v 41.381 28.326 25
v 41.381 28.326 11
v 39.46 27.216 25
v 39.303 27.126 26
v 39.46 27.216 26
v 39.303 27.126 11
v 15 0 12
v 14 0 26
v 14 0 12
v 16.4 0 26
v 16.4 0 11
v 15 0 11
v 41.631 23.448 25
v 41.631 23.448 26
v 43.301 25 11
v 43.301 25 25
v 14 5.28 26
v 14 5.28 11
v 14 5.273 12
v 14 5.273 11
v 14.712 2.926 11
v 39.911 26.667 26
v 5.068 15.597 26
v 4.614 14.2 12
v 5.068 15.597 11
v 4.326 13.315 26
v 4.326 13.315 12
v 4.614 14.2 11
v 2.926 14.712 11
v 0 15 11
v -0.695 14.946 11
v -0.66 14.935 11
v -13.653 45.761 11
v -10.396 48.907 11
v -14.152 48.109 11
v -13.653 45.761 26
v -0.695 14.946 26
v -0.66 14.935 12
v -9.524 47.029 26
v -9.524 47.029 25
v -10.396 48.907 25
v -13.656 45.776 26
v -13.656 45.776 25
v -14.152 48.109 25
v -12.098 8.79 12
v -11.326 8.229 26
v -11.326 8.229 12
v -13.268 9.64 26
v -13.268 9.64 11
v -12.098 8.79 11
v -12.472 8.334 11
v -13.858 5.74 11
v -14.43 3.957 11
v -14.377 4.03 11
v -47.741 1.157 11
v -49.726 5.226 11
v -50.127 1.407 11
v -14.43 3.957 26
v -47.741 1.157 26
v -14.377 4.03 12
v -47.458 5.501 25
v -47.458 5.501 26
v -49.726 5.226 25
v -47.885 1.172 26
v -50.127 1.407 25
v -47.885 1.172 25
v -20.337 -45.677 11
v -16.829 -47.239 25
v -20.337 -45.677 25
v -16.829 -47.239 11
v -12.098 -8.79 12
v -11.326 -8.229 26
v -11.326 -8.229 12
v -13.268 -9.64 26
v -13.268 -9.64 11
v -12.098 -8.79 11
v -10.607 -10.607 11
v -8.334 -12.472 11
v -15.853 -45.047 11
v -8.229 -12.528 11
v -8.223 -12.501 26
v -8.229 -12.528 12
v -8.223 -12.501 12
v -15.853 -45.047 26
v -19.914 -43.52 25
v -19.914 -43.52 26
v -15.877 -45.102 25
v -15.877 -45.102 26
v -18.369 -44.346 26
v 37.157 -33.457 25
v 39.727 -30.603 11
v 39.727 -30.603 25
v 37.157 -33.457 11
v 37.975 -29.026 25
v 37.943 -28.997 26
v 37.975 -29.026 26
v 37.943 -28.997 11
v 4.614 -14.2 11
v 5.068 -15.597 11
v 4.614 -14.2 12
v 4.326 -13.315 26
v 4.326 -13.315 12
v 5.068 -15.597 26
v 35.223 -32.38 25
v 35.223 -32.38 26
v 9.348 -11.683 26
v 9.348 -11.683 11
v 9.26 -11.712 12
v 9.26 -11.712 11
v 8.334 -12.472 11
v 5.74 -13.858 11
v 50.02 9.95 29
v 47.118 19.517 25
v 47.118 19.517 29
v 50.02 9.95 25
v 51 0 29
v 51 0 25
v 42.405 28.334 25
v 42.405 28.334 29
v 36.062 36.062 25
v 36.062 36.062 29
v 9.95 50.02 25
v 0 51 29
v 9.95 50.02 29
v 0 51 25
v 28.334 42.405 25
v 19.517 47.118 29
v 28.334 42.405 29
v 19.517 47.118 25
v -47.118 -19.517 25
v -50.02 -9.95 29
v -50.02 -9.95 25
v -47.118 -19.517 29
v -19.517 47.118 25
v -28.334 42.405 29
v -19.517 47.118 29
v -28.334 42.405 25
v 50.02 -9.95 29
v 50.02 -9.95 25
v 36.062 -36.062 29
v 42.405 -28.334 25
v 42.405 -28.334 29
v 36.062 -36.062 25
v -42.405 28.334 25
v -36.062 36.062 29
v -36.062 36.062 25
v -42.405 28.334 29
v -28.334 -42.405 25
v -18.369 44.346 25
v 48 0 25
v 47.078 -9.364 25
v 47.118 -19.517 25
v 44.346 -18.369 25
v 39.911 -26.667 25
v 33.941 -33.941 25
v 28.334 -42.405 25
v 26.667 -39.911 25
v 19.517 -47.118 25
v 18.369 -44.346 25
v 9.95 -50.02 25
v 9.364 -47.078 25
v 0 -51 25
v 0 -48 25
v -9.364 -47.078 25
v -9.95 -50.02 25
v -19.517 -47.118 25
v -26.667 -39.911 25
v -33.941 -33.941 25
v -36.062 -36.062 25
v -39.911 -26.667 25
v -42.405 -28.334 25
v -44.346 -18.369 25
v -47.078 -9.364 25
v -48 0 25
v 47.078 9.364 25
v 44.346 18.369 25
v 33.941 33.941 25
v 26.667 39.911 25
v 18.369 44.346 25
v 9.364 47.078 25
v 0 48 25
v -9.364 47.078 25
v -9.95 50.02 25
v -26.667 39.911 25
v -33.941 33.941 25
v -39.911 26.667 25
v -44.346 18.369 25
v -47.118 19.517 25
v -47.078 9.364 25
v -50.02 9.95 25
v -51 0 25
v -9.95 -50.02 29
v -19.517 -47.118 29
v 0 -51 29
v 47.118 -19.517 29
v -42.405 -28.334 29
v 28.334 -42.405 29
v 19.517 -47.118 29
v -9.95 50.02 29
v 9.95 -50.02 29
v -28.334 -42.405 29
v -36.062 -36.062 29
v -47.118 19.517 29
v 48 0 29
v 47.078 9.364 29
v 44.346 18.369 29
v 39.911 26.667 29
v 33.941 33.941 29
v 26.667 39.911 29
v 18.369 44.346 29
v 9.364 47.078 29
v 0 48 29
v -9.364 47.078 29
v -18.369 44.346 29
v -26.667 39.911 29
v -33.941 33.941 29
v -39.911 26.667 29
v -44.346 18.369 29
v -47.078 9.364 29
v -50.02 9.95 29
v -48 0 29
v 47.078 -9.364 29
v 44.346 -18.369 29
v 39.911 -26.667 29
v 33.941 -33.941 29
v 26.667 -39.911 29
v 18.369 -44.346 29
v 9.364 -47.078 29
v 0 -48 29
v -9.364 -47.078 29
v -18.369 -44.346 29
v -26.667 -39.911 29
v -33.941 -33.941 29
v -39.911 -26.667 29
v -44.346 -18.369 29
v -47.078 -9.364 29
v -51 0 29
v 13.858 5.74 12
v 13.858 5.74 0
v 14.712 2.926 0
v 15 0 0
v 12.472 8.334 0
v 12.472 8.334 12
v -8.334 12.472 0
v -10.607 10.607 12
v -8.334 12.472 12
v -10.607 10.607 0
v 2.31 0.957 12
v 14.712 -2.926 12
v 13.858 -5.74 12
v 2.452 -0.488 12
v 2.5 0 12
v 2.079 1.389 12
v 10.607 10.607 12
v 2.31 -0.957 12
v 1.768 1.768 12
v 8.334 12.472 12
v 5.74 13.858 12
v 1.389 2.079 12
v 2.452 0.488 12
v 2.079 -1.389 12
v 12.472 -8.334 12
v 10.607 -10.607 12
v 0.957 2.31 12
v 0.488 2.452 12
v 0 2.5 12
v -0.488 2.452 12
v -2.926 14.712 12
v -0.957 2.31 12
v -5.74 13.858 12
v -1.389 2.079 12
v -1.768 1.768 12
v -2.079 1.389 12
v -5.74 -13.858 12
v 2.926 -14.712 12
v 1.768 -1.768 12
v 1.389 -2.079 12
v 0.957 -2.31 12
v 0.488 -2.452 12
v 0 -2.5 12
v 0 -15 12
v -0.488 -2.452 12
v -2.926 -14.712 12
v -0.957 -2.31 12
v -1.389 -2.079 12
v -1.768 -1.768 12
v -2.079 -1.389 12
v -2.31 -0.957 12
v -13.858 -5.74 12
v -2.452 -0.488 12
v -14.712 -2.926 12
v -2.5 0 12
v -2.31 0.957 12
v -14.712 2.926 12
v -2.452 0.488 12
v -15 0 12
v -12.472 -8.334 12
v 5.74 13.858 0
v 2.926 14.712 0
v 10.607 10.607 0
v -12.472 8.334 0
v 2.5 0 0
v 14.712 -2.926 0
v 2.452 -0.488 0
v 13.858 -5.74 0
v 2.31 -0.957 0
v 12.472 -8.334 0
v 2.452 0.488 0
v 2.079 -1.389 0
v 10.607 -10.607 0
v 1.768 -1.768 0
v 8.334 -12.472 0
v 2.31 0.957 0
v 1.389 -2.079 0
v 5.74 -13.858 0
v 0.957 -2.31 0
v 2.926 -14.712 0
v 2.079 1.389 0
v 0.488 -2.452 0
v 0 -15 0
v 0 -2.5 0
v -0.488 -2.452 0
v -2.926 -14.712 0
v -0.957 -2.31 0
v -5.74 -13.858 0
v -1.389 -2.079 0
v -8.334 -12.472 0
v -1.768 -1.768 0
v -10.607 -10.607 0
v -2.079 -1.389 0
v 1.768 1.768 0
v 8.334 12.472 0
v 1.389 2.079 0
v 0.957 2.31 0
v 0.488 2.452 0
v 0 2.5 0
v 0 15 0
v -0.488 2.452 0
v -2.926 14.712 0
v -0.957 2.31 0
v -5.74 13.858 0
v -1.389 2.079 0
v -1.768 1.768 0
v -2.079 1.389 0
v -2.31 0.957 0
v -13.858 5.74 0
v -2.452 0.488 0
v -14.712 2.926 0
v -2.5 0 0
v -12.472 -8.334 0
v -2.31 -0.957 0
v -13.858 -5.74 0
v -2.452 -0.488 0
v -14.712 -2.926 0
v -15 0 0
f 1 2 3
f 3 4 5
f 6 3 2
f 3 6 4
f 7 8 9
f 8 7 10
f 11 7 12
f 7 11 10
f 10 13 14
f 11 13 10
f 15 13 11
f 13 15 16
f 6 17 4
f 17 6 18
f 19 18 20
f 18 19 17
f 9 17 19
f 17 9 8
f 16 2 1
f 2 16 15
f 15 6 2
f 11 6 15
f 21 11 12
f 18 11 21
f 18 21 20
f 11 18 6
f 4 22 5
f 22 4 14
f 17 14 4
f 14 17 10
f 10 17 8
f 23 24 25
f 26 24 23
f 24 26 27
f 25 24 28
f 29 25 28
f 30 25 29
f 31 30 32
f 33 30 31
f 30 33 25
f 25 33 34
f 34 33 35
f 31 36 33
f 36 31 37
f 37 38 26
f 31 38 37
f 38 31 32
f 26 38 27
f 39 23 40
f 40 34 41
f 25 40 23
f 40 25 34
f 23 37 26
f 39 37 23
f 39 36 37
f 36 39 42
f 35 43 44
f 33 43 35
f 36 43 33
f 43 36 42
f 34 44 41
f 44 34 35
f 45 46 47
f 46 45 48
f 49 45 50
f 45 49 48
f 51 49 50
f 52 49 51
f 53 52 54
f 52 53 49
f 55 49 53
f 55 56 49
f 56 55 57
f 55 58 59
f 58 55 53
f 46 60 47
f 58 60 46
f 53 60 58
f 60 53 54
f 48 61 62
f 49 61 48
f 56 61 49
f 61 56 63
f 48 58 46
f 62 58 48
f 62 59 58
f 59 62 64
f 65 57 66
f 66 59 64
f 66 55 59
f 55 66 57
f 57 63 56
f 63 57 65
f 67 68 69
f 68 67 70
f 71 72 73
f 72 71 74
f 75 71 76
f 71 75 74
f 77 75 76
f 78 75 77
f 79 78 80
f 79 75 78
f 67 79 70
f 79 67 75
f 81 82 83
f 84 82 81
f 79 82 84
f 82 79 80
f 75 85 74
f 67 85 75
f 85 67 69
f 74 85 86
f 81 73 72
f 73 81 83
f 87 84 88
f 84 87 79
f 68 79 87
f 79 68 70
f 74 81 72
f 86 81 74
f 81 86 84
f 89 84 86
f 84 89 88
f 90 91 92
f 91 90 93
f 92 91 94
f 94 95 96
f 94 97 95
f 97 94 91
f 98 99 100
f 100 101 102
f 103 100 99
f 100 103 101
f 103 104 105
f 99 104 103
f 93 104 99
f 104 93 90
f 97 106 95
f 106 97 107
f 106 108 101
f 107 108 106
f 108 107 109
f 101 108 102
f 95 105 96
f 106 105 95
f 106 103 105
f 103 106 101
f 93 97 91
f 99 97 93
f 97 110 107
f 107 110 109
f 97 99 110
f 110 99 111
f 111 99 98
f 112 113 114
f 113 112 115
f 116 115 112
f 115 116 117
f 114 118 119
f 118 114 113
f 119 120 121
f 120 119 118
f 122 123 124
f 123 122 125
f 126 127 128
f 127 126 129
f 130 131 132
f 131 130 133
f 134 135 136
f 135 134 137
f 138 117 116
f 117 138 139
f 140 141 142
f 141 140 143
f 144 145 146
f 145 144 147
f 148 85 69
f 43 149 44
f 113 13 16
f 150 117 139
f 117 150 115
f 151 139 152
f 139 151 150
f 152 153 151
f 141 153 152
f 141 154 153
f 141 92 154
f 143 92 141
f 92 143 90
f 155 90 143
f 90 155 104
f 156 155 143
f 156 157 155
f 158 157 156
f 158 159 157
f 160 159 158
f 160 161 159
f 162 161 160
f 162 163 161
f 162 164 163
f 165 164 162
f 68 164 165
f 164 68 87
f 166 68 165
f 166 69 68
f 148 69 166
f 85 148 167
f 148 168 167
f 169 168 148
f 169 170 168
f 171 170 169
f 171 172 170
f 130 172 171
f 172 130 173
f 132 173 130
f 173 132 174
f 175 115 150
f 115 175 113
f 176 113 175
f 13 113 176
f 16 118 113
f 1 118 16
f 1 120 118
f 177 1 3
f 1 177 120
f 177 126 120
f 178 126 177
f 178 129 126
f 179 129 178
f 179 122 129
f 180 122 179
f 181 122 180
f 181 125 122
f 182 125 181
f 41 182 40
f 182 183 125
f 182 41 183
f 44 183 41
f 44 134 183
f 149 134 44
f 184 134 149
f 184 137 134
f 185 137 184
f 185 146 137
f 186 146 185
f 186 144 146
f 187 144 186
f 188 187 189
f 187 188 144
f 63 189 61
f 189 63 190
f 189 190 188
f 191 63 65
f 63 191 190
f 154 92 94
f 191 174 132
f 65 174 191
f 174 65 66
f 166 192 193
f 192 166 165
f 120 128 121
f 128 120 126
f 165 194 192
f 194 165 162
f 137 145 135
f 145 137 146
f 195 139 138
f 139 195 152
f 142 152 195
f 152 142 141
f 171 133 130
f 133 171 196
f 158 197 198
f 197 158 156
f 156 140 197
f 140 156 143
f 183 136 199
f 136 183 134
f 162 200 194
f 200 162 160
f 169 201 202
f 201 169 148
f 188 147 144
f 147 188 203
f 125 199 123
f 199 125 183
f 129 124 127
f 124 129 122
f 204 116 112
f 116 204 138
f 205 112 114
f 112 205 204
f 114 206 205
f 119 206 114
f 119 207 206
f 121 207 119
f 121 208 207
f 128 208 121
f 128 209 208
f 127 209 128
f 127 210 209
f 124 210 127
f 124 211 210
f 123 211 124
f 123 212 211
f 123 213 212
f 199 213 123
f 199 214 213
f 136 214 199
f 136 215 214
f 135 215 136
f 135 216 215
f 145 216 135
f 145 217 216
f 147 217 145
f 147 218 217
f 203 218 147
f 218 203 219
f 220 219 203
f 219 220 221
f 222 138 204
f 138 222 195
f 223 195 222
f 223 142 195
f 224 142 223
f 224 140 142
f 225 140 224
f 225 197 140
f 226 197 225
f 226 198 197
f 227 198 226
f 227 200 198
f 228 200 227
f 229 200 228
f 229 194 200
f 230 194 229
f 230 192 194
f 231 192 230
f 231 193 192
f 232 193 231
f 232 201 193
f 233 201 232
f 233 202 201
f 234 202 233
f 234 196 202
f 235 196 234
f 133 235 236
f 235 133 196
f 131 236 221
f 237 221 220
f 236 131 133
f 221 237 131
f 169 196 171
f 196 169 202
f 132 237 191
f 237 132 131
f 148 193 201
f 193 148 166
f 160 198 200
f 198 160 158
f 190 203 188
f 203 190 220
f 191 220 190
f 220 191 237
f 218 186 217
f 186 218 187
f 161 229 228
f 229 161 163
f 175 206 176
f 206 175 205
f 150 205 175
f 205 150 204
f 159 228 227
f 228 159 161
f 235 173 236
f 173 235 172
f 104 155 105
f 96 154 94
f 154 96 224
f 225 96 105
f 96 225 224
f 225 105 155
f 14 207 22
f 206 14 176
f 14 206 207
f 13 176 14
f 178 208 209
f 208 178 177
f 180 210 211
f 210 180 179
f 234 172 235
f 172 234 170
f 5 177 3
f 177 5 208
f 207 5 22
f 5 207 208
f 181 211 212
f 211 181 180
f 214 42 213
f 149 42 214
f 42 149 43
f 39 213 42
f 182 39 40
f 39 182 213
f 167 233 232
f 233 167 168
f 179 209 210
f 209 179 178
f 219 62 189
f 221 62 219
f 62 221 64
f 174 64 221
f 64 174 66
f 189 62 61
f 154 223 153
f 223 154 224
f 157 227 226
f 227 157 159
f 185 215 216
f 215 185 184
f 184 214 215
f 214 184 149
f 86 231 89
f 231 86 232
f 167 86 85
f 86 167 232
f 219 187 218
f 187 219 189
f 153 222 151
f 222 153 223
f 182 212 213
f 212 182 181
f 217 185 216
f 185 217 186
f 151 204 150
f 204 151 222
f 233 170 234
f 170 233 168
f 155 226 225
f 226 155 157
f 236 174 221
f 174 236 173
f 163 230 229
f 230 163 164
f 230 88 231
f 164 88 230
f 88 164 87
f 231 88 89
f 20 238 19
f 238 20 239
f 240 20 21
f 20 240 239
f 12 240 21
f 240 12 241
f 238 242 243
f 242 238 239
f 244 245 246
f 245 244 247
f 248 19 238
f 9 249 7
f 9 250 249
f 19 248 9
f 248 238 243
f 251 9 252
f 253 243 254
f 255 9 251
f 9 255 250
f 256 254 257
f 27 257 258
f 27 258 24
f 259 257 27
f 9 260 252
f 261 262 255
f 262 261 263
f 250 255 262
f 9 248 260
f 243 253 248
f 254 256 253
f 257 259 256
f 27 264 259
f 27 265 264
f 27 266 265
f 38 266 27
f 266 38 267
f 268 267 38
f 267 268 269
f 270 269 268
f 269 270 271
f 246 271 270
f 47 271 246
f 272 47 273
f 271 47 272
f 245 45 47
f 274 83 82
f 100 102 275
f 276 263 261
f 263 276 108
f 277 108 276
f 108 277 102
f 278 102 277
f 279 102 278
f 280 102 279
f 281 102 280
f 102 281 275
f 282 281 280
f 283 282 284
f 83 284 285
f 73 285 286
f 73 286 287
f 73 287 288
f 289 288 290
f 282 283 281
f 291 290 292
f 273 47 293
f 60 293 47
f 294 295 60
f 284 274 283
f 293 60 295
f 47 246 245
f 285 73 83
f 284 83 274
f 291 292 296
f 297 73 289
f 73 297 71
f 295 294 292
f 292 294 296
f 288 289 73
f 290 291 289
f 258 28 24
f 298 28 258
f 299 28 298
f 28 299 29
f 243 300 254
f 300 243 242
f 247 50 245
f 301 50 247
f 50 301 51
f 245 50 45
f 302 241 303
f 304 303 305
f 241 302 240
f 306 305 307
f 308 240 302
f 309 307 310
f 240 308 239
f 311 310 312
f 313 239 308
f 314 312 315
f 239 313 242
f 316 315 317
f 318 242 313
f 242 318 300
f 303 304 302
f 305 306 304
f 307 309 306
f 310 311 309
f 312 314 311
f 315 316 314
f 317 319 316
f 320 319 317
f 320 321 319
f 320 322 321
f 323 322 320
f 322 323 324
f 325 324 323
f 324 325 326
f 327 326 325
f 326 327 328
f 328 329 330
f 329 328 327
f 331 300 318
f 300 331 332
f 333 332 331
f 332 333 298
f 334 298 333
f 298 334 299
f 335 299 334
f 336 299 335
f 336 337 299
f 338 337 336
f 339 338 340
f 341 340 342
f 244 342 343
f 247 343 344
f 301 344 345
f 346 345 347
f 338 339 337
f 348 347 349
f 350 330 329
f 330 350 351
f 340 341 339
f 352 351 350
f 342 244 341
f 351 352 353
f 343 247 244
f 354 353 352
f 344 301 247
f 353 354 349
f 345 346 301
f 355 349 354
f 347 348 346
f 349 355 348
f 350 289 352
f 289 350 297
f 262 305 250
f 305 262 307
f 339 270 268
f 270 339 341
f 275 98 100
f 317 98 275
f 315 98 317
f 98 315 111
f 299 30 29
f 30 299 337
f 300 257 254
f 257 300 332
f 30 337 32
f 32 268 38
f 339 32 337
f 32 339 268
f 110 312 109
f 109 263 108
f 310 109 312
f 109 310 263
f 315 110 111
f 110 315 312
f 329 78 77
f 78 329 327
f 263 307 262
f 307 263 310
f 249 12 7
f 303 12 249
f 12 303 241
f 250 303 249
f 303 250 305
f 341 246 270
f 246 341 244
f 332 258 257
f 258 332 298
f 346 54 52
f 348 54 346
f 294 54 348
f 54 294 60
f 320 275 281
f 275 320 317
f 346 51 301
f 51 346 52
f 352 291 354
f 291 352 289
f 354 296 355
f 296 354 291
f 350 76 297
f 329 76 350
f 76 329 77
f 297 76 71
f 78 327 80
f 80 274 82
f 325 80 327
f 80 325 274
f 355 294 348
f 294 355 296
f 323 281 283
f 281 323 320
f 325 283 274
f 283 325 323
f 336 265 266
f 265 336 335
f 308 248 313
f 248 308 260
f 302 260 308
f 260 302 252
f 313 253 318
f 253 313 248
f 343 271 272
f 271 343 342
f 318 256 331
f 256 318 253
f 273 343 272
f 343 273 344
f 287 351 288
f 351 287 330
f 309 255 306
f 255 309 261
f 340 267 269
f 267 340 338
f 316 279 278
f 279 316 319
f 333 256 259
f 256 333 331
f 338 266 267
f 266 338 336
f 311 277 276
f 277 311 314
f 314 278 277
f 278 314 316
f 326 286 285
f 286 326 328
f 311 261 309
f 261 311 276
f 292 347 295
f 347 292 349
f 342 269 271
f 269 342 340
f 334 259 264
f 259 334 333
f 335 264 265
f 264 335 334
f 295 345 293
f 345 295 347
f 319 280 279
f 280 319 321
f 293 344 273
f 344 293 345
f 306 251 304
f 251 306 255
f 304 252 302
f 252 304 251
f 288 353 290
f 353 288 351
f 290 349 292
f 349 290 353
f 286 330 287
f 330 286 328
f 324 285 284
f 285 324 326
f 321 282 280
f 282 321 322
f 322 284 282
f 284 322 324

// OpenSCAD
$fn = 32;

// ----------------------------------------------------------------------
// Impeller: 100 mm, 5 blades, 29 mm tall
// ----------------------------------------------------------------------

// --- parameters (mm) ---
boss_d = 30;              // hub diameter
boss_h = 12;              // hub height
rotor_d = 100;            // outer diameter over the blades
vane_count = 5;           // number of blades
blade_t = 2.4;            // blade thickness
blade_h = 14;             // blade height
blade_in_r = 14;          // blade root radius
blade_out_r = 47.6;       // blade tip radius
sweep = 30;               // blade sweep, degrees
bore_d = 5;               // shaft bore
shroud_h = 3;             // shroud ring thickness
shroud_d = 102;           // shroud outside diameter

module hub() {
  cylinder(h = boss_h, d = boss_d);
}

module blade() {
  /* blade swept between two boxes: hull of the root and the tip section */
  hull() {
    translate([blade_in_r, 0, boss_h - 1])
      cube([blade_t, blade_t * 2.2, blade_h + 1], center = false);
    rotate([0, 0, sweep])
      translate([blade_out_r, 0, boss_h - 1])
        cube([blade_t, blade_t * 1.6, blade_h + 1], center = false);
  }
}

module blades() {
  for (i = [0 : vane_count - 1])
    rotate([0, 0, i * 360 / vane_count]) blade();
}

module shroud() {
  translate([0, 0, boss_h + blade_h - 1])
    difference() {
      cylinder(h = shroud_h + 1, d = shroud_d);
      translate([0, 0, -1]) cylinder(h = shroud_h + 3, d = shroud_d - 2 * 3);
    }
}

difference() {
  union() {
    hub();
    blades();
    shroud();
  }
  translate([0, 0, -1]) cylinder(h = boss_h + blade_h + shroud_h + 3, d = bore_d);
}
